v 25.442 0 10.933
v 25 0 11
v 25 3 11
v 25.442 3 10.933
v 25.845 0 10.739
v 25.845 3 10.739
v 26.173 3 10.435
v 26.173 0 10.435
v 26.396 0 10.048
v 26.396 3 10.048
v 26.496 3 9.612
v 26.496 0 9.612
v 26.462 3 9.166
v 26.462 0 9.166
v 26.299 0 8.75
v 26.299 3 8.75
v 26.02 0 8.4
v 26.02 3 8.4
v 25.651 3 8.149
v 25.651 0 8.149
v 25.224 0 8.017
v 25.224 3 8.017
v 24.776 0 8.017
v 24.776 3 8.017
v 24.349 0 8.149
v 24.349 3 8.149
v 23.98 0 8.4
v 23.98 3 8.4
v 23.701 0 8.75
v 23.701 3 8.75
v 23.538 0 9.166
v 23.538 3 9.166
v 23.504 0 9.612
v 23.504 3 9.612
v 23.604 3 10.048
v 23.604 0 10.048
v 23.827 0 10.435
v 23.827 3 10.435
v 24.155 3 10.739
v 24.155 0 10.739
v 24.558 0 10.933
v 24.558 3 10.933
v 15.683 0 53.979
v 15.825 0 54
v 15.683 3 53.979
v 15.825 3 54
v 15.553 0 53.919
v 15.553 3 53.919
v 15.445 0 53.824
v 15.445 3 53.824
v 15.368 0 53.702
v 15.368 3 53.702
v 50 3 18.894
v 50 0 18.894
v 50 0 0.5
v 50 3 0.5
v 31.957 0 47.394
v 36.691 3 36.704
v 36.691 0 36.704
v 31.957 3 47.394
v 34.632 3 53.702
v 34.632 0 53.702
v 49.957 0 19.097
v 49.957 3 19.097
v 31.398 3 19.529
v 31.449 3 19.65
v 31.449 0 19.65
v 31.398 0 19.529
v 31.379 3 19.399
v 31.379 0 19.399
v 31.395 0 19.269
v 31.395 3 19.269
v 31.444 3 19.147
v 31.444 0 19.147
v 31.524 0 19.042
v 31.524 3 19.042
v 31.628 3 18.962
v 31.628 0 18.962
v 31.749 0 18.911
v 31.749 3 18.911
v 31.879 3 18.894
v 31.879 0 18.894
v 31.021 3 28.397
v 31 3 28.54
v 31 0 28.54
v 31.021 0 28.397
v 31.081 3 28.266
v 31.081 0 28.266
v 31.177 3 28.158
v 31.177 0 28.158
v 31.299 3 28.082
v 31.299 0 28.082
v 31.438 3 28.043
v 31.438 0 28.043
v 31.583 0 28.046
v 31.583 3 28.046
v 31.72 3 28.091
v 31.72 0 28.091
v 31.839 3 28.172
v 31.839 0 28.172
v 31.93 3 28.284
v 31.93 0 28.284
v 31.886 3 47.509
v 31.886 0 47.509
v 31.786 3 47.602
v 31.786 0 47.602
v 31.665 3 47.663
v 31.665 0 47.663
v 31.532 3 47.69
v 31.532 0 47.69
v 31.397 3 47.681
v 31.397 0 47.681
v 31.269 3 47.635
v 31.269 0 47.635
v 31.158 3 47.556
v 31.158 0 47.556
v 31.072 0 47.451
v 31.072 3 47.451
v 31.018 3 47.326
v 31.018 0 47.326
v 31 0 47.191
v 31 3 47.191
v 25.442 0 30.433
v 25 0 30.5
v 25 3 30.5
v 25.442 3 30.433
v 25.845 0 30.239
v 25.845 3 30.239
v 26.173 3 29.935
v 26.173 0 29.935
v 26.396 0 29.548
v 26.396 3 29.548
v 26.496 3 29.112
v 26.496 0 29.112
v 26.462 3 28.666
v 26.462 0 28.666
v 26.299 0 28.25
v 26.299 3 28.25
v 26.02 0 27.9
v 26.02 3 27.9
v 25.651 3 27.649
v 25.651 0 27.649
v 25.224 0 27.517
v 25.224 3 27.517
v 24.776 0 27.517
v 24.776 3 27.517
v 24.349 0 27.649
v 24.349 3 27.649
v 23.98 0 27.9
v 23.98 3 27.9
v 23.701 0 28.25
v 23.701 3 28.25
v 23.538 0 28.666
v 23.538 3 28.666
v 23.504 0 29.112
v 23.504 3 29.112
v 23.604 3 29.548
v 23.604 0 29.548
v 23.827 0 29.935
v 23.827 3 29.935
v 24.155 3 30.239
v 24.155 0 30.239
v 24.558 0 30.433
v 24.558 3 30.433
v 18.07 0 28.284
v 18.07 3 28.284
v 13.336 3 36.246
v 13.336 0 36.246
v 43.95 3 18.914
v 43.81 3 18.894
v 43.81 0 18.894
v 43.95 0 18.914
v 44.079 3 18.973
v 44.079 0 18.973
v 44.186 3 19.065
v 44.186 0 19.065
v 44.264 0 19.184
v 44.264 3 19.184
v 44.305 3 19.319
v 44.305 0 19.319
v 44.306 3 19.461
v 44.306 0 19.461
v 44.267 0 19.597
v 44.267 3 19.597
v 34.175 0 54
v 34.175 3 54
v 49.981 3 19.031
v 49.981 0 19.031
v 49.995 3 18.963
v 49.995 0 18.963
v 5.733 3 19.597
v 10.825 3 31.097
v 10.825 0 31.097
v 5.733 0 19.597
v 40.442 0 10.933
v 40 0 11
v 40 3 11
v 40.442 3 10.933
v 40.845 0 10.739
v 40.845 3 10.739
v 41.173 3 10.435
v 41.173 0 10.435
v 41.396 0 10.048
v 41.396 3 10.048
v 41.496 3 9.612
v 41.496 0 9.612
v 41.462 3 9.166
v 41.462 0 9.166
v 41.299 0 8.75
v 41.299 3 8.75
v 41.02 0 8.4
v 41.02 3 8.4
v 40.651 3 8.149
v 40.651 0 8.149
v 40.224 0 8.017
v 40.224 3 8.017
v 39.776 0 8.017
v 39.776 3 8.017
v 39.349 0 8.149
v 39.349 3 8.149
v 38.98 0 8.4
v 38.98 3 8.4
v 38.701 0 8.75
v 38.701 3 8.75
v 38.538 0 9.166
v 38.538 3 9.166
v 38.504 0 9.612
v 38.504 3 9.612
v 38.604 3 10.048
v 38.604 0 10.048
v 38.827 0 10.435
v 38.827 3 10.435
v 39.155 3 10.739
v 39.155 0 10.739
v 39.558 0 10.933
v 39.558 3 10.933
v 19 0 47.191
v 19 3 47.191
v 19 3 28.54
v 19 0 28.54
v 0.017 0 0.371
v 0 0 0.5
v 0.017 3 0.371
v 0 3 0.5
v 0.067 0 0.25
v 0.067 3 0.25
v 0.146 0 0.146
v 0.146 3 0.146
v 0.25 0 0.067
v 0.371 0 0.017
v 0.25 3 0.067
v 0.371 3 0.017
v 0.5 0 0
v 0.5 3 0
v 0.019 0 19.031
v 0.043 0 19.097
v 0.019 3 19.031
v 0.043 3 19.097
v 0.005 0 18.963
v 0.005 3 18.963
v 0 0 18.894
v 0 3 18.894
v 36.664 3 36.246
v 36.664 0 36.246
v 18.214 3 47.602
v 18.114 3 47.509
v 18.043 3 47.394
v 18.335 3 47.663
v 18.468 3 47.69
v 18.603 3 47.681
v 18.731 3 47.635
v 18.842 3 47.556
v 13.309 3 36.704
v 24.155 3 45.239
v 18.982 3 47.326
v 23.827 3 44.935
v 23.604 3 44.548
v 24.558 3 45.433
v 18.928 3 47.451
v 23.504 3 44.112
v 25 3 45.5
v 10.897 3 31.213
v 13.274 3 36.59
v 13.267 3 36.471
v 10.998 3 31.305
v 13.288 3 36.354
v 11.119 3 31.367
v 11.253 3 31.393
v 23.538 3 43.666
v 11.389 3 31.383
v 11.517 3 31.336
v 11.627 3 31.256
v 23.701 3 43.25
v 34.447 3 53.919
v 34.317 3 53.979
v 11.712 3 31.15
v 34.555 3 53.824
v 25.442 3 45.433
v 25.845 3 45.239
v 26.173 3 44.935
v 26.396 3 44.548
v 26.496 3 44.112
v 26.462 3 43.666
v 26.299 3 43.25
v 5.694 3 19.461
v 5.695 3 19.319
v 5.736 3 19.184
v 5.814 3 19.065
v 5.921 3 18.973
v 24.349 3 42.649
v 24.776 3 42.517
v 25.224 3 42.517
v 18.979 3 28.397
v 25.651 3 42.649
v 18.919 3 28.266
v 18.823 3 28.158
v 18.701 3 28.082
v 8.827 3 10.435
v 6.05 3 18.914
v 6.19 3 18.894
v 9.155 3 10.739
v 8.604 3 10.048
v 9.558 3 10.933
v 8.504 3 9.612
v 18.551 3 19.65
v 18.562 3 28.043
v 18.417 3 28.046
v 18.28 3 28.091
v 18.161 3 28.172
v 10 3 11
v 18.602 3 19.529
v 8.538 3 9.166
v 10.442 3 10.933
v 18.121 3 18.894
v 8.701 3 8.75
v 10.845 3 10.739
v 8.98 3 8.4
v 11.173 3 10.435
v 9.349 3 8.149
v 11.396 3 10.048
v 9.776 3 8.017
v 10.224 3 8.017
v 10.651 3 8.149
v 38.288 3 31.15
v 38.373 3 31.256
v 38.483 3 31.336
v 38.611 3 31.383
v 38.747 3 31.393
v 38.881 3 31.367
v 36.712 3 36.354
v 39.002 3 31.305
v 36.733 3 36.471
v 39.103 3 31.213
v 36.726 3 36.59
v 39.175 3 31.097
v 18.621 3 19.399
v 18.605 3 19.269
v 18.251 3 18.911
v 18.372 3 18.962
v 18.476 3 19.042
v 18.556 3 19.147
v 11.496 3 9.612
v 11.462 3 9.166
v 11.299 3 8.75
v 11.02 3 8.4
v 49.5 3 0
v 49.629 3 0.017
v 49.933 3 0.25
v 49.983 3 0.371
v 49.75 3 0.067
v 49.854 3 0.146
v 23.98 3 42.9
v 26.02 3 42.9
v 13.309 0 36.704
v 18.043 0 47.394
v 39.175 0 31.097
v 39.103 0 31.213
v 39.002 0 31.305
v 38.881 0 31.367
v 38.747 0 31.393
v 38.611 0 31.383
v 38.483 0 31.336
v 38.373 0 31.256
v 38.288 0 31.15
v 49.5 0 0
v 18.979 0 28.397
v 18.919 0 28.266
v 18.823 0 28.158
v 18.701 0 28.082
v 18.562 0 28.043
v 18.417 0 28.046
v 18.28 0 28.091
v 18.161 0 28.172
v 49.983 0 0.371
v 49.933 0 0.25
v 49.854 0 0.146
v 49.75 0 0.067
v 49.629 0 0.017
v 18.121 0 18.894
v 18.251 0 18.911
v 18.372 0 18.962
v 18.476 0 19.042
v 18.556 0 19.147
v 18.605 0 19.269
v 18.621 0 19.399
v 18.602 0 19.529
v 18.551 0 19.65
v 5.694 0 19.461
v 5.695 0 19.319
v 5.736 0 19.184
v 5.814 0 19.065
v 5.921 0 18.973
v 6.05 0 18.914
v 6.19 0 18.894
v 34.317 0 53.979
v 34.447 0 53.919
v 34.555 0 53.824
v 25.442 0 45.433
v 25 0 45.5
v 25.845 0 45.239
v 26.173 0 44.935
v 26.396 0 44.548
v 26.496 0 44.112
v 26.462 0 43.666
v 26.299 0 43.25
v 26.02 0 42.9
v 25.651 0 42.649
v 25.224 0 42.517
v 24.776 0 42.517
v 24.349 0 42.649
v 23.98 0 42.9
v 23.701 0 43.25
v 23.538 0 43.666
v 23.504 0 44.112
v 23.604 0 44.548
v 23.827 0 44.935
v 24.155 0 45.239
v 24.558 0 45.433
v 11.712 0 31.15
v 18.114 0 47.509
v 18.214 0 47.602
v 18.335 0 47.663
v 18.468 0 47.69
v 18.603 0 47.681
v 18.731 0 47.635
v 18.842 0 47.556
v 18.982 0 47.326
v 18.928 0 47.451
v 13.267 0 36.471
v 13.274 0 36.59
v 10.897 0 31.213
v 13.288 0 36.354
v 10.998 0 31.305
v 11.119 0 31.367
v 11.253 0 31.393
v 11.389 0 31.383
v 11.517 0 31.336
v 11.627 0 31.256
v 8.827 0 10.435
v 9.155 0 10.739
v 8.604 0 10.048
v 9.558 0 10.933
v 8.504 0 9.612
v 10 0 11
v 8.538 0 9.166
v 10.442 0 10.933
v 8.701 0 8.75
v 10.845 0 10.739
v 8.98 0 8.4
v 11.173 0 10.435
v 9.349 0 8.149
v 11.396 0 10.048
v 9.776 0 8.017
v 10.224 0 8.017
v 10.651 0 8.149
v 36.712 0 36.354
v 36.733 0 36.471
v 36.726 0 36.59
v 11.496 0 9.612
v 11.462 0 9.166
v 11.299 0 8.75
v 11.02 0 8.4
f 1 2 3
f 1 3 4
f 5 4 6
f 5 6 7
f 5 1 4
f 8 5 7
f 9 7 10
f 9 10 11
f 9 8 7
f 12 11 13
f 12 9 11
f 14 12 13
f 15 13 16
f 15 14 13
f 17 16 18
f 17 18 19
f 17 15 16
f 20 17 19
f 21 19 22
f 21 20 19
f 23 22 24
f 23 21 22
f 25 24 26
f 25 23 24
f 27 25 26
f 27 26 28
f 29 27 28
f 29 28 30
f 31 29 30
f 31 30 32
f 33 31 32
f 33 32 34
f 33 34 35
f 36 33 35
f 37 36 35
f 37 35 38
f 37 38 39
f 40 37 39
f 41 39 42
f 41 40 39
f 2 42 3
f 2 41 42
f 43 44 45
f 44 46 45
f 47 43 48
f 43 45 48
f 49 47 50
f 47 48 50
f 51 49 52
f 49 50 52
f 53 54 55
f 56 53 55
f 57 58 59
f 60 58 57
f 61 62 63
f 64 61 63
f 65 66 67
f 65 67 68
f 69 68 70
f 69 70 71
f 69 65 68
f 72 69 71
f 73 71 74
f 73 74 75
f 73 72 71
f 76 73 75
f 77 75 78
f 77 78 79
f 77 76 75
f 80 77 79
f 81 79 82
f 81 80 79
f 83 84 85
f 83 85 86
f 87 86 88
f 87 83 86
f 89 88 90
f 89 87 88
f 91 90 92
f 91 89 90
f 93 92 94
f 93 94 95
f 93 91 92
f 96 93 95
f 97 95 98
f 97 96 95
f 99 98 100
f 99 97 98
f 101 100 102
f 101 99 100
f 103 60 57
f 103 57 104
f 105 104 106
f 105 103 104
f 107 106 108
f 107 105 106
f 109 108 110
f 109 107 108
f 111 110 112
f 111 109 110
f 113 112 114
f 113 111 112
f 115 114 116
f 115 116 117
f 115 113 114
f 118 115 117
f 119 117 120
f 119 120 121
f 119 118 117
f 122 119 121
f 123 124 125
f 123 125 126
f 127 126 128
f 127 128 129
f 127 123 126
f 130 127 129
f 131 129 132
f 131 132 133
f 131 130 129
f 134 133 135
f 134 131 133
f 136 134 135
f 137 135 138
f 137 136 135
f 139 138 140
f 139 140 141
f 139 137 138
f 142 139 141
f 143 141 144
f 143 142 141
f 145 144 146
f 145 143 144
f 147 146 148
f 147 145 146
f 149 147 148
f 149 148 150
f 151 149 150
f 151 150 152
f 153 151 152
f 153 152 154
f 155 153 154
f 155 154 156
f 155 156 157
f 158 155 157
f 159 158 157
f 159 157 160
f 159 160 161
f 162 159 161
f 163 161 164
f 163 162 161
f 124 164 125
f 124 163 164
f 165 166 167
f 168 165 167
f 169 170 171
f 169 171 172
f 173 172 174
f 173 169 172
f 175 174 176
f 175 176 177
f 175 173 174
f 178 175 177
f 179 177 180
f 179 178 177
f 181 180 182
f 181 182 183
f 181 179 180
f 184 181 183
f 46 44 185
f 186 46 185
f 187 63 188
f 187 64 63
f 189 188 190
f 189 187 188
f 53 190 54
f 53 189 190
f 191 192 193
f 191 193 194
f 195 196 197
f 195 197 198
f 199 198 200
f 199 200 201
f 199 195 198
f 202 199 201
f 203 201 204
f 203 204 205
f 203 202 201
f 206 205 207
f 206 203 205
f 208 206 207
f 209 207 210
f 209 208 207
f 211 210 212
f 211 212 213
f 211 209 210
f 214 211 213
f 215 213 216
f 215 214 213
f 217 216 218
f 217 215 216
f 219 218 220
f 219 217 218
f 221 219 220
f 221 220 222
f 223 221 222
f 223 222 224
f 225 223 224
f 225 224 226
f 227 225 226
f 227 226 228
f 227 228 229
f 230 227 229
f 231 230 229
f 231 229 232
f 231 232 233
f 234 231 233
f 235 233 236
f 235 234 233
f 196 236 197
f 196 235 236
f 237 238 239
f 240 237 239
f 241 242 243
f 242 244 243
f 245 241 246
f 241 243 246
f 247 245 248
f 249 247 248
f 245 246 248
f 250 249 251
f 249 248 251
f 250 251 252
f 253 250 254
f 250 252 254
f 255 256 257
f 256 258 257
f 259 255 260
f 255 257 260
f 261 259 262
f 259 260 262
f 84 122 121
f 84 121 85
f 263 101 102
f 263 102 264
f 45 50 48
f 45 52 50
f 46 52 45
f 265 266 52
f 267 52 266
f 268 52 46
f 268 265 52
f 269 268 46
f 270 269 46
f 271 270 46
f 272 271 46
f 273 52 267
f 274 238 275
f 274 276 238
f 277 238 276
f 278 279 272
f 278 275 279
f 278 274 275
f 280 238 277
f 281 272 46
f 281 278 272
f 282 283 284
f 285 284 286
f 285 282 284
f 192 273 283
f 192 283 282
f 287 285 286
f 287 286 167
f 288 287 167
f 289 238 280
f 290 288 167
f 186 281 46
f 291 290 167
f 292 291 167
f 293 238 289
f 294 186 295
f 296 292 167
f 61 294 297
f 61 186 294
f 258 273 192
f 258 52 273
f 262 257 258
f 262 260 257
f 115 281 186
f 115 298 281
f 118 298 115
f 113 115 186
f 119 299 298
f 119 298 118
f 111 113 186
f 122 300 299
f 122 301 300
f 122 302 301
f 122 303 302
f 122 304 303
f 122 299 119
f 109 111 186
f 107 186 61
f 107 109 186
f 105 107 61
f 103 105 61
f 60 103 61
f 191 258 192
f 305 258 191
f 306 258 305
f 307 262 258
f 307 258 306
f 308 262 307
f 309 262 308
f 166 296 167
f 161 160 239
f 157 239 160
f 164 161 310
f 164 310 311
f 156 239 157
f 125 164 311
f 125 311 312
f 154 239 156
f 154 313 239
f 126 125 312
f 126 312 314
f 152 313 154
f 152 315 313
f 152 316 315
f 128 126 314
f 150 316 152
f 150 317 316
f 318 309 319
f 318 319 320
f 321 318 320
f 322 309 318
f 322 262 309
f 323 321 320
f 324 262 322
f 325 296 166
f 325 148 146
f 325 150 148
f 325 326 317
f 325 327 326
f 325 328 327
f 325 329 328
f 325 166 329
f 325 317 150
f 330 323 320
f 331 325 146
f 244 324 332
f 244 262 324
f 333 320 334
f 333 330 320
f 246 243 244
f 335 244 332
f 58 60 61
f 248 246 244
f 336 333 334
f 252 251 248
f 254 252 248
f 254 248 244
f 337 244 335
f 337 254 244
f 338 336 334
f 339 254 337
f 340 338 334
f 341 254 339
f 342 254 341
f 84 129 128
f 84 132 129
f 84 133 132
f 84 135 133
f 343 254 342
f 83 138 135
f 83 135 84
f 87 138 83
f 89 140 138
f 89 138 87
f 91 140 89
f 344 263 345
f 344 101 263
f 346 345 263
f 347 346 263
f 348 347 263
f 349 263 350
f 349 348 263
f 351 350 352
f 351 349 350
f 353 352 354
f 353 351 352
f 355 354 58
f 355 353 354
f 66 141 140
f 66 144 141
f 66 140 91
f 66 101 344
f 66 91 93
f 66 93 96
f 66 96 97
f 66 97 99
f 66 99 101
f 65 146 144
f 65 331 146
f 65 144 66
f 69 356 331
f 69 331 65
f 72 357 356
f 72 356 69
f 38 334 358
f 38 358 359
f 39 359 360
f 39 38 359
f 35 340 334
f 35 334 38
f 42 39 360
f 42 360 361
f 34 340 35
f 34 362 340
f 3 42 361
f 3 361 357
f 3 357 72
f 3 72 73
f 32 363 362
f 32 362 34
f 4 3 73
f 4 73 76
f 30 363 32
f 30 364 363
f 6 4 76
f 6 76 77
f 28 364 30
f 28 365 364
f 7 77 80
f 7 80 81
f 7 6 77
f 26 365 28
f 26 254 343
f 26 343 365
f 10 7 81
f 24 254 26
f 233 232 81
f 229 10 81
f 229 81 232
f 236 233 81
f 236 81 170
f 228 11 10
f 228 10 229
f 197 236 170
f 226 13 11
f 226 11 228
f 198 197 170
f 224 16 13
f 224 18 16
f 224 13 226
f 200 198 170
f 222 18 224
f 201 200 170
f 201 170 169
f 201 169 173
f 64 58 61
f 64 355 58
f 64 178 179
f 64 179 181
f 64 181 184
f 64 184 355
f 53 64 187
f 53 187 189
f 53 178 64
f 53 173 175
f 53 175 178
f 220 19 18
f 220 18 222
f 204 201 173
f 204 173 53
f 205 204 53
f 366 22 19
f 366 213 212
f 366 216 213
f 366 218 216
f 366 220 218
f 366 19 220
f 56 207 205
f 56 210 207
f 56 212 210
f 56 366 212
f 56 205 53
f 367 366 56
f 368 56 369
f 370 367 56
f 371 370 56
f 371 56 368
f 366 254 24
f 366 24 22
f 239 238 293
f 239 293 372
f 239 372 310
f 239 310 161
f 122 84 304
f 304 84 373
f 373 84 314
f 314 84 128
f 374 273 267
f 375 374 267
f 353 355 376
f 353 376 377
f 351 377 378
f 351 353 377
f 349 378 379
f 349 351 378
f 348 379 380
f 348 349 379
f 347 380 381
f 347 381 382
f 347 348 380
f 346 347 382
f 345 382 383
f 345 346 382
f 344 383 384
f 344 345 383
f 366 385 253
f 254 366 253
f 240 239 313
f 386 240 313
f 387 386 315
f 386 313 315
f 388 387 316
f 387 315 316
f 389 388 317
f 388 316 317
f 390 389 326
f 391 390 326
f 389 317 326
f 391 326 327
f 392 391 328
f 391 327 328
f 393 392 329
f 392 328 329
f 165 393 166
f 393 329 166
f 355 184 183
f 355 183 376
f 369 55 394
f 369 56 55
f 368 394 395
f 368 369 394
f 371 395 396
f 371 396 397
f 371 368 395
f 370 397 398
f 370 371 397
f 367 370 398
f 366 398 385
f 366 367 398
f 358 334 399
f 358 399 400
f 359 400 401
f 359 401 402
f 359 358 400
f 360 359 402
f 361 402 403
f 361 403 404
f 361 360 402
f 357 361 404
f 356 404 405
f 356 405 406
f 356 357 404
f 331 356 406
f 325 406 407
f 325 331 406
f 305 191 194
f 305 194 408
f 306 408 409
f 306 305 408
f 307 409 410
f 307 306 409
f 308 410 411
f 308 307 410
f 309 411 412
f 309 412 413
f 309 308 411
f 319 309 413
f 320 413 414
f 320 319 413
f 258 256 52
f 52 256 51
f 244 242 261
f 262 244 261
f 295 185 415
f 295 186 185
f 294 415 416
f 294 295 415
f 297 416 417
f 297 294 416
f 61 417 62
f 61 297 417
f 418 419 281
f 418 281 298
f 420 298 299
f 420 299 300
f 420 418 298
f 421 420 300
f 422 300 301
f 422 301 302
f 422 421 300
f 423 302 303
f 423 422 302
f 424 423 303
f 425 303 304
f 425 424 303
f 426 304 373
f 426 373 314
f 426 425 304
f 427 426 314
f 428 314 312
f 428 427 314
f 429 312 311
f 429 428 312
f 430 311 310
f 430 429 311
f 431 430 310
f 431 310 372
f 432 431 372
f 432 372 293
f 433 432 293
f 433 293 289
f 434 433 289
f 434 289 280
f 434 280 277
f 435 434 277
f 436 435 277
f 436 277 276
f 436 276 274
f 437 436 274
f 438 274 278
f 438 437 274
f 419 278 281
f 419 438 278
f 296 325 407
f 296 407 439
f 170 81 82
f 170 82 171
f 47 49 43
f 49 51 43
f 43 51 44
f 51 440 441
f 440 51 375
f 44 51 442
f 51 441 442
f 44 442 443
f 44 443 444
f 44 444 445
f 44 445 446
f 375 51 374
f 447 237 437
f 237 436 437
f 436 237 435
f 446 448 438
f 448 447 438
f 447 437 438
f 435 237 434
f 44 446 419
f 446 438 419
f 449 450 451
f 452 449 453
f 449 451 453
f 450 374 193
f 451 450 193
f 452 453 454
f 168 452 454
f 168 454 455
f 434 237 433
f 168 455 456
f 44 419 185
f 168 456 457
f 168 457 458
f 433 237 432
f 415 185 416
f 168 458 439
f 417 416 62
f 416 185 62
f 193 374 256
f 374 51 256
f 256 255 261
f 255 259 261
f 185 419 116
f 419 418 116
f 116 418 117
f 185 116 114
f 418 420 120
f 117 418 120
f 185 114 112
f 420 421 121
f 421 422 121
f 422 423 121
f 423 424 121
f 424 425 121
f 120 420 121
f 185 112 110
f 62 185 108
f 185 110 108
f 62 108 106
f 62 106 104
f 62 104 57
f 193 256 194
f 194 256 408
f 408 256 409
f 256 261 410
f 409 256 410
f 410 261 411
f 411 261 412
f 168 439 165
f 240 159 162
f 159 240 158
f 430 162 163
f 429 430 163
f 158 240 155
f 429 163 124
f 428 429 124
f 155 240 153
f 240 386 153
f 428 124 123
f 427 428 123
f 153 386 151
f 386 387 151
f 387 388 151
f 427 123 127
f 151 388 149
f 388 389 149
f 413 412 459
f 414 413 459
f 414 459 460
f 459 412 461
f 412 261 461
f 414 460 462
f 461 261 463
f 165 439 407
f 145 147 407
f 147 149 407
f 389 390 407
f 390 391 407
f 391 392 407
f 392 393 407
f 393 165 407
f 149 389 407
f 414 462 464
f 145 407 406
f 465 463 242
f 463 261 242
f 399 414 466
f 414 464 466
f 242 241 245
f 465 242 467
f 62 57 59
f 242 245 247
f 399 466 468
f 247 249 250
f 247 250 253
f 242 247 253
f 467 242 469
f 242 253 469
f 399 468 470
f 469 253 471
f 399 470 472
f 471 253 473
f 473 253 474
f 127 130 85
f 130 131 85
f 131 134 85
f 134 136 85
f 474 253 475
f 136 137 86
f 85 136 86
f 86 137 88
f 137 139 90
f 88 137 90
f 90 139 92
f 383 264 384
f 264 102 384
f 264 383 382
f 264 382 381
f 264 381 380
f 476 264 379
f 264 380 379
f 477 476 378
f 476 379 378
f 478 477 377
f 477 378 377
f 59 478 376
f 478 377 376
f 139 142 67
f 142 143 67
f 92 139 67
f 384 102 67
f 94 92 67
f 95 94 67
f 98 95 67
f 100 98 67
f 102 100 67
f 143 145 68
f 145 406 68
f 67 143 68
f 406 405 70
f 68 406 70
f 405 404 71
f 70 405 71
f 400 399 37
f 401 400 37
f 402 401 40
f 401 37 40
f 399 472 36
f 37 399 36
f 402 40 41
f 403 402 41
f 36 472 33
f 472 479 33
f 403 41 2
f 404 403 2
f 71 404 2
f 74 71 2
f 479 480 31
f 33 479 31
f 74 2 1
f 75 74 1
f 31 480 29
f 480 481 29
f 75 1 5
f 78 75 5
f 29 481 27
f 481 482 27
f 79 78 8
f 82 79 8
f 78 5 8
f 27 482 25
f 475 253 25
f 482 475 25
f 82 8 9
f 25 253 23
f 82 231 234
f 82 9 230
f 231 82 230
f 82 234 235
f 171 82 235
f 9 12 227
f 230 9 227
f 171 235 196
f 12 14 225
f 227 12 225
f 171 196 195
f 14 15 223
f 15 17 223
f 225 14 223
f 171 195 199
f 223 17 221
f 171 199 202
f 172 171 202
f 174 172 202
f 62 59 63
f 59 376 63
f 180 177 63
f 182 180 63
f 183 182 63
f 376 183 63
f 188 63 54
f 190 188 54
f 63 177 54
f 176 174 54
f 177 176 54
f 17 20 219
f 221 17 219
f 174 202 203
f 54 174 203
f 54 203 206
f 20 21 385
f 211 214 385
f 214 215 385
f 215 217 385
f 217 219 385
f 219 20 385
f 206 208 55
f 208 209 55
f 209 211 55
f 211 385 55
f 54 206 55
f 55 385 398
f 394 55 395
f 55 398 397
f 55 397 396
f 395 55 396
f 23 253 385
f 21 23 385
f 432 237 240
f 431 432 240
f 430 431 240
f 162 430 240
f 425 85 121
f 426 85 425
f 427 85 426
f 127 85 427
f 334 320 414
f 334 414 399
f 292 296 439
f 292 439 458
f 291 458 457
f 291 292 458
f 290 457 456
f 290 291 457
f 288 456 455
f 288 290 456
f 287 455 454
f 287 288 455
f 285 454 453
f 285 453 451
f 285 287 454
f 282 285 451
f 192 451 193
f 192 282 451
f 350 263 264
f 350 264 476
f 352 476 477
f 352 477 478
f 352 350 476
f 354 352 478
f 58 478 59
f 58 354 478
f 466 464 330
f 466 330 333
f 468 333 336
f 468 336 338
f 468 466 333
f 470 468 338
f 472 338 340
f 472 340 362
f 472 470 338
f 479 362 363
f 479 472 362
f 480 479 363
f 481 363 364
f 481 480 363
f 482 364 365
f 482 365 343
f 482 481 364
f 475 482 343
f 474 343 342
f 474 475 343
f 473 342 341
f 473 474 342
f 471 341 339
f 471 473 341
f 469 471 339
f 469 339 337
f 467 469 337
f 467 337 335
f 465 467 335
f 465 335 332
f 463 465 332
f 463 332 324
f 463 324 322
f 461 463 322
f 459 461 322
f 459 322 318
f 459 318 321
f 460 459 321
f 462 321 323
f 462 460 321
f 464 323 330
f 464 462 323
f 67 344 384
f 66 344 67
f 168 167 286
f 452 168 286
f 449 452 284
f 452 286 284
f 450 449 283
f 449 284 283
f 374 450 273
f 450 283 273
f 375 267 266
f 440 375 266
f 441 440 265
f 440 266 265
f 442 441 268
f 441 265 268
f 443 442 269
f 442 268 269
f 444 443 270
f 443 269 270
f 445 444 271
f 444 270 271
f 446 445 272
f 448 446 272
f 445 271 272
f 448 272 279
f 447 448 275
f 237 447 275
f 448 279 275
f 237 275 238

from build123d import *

# Parameters (mm, degrees)
SKETCH1_R           = 1.5
BOSS_EXTRUDE2_DEPTH = 3
FILLET1_R           = 0.5
CUT_EXTRUDE1_DEPTH  = 3


with BuildPart() as part:
    # Sketch1 → Boss-Extrude2 (new body)
    with BuildSketch(Plane(origin=(0, 0, 0), x_dir=(1, 0, 0), z_dir=(0, 1, 0))):
        Polygon((15.5, -54), (34.5, -54), (50, -19), (50, 0), (0, 0), (0, -19), align=None)
        with Locations(Location((10, -9.5, 0), (0, 0, 270))):
            Circle(SKETCH1_R, mode=Mode.SUBTRACT)
        with Locations(Location((40, -9.5, 0), (0, 0, 270))):
            Circle(SKETCH1_R, mode=Mode.SUBTRACT)
        with Locations(Location((25, -44, 0), (0, 0, 270))):
            Circle(SKETCH1_R, mode=Mode.SUBTRACT)
        with Locations(Location((25, -29, 0), (0, 0, 270))):
            Circle(SKETCH1_R, mode=Mode.SUBTRACT)
        with Locations(Location((25, -9.5, 0), (0, 0, 270))):
            Circle(SKETCH1_R, mode=Mode.SUBTRACT)
    extrude(amount=BOSS_EXTRUDE2_DEPTH)

    # Fillet1
    fillet1_edges = [part.edges().sort_by_distance(p)[0] for p in [
        (50, 1.5, 0),
        (50, 1.5, 19),
        (34.5, 1.5, 54),
        (15.5, 1.5, 54),
        (0, 1.5, 19),
        (0, 1.5, 0),
    ]]
    fillet(fillet1_edges, radius=FILLET1_R)

    # Sketch2 → Cut-Extrude1 (cut)
    with BuildSketch(Plane(origin=(0, 3, 0), x_dir=(1, 0, 0), z_dir=(0, 1, 0))):
        with BuildLine():
            Line((6.189797727, -18.894239223), (18.120962557, -18.894239223))
            ThreePointArc((18.120962557, -18.894239223), (18.555574645, -19.147030136), (18.550722787, -19.649789891))
            Line((18.550722787, -19.649789891), (11.712415101, -31.149789891))
            ThreePointArc((11.712415101, -31.149789891), (11.25278078, -31.393345964), (10.825480175, -31.096702302))
            Line((10.825480175, -31.096702302), (5.732623032, -19.596702302))
            ThreePointArc((5.732623032, -19.596702302), (5.770732375, -19.121504498), (6.189797727, -18.894239223))
        make_face()
        with BuildLine():
            Line((18.070239769, -28.284056063), (13.335984482, -36.245665617))
            ThreePointArc((13.335984482, -36.245665617), (13.266637971, -36.471342196), (13.308570017, -36.703679365))
            Line((13.308570017, -36.703679365), (18.042825305, -47.39393324))
            ThreePointArc((18.042825305, -47.39393324), (18.603471379, -47.680646687), (19, -47.191470161))
            Line((19, -47.191470161), (19, -28.539606732))
            ThreePointArc((19, -28.539606732), (18.632513933, -28.057486355), (18.070239769, -28.284056063))
        make_face()
        with BuildLine():
            Line((38.287584899, -31.149789891), (31.449277213, -19.649789891))
            ThreePointArc((31.449277213, -19.649789891), (31.444425355, -19.147030136), (31.879037443, -18.894239223))
            Line((31.879037443, -18.894239223), (43.810202273, -18.894239223))
            ThreePointArc((43.810202273, -18.894239223), (44.229267625, -19.121504498), (44.267376968, -19.596702302))
            Line((44.267376968, -19.596702302), (39.174519825, -31.096702302))
            ThreePointArc((39.174519825, -31.096702302), (38.74721922, -31.393345964), (38.287584899, -31.149789891))
        make_face()
        with BuildLine():
            Line((31, -47.191470161), (31, -28.539606732))
            ThreePointArc((31, -28.539606732), (31.367486067, -28.057486355), (31.929760231, -28.284056063))
            Line((31.929760231, -28.284056063), (36.664015518, -36.245665617))
            ThreePointArc((36.664015518, -36.245665617), (36.733362029, -36.471342196), (36.691429983, -36.703679365))
            Line((36.691429983, -36.703679365), (31.957174695, -47.39393324))
            ThreePointArc((31.957174695, -47.39393324), (31.396528621, -47.680646687), (31, -47.191470161))
        make_face()
    extrude(amount=-CUT_EXTRUDE1_DEPTH, mode=Mode.SUBTRACT)


solid = part.part
